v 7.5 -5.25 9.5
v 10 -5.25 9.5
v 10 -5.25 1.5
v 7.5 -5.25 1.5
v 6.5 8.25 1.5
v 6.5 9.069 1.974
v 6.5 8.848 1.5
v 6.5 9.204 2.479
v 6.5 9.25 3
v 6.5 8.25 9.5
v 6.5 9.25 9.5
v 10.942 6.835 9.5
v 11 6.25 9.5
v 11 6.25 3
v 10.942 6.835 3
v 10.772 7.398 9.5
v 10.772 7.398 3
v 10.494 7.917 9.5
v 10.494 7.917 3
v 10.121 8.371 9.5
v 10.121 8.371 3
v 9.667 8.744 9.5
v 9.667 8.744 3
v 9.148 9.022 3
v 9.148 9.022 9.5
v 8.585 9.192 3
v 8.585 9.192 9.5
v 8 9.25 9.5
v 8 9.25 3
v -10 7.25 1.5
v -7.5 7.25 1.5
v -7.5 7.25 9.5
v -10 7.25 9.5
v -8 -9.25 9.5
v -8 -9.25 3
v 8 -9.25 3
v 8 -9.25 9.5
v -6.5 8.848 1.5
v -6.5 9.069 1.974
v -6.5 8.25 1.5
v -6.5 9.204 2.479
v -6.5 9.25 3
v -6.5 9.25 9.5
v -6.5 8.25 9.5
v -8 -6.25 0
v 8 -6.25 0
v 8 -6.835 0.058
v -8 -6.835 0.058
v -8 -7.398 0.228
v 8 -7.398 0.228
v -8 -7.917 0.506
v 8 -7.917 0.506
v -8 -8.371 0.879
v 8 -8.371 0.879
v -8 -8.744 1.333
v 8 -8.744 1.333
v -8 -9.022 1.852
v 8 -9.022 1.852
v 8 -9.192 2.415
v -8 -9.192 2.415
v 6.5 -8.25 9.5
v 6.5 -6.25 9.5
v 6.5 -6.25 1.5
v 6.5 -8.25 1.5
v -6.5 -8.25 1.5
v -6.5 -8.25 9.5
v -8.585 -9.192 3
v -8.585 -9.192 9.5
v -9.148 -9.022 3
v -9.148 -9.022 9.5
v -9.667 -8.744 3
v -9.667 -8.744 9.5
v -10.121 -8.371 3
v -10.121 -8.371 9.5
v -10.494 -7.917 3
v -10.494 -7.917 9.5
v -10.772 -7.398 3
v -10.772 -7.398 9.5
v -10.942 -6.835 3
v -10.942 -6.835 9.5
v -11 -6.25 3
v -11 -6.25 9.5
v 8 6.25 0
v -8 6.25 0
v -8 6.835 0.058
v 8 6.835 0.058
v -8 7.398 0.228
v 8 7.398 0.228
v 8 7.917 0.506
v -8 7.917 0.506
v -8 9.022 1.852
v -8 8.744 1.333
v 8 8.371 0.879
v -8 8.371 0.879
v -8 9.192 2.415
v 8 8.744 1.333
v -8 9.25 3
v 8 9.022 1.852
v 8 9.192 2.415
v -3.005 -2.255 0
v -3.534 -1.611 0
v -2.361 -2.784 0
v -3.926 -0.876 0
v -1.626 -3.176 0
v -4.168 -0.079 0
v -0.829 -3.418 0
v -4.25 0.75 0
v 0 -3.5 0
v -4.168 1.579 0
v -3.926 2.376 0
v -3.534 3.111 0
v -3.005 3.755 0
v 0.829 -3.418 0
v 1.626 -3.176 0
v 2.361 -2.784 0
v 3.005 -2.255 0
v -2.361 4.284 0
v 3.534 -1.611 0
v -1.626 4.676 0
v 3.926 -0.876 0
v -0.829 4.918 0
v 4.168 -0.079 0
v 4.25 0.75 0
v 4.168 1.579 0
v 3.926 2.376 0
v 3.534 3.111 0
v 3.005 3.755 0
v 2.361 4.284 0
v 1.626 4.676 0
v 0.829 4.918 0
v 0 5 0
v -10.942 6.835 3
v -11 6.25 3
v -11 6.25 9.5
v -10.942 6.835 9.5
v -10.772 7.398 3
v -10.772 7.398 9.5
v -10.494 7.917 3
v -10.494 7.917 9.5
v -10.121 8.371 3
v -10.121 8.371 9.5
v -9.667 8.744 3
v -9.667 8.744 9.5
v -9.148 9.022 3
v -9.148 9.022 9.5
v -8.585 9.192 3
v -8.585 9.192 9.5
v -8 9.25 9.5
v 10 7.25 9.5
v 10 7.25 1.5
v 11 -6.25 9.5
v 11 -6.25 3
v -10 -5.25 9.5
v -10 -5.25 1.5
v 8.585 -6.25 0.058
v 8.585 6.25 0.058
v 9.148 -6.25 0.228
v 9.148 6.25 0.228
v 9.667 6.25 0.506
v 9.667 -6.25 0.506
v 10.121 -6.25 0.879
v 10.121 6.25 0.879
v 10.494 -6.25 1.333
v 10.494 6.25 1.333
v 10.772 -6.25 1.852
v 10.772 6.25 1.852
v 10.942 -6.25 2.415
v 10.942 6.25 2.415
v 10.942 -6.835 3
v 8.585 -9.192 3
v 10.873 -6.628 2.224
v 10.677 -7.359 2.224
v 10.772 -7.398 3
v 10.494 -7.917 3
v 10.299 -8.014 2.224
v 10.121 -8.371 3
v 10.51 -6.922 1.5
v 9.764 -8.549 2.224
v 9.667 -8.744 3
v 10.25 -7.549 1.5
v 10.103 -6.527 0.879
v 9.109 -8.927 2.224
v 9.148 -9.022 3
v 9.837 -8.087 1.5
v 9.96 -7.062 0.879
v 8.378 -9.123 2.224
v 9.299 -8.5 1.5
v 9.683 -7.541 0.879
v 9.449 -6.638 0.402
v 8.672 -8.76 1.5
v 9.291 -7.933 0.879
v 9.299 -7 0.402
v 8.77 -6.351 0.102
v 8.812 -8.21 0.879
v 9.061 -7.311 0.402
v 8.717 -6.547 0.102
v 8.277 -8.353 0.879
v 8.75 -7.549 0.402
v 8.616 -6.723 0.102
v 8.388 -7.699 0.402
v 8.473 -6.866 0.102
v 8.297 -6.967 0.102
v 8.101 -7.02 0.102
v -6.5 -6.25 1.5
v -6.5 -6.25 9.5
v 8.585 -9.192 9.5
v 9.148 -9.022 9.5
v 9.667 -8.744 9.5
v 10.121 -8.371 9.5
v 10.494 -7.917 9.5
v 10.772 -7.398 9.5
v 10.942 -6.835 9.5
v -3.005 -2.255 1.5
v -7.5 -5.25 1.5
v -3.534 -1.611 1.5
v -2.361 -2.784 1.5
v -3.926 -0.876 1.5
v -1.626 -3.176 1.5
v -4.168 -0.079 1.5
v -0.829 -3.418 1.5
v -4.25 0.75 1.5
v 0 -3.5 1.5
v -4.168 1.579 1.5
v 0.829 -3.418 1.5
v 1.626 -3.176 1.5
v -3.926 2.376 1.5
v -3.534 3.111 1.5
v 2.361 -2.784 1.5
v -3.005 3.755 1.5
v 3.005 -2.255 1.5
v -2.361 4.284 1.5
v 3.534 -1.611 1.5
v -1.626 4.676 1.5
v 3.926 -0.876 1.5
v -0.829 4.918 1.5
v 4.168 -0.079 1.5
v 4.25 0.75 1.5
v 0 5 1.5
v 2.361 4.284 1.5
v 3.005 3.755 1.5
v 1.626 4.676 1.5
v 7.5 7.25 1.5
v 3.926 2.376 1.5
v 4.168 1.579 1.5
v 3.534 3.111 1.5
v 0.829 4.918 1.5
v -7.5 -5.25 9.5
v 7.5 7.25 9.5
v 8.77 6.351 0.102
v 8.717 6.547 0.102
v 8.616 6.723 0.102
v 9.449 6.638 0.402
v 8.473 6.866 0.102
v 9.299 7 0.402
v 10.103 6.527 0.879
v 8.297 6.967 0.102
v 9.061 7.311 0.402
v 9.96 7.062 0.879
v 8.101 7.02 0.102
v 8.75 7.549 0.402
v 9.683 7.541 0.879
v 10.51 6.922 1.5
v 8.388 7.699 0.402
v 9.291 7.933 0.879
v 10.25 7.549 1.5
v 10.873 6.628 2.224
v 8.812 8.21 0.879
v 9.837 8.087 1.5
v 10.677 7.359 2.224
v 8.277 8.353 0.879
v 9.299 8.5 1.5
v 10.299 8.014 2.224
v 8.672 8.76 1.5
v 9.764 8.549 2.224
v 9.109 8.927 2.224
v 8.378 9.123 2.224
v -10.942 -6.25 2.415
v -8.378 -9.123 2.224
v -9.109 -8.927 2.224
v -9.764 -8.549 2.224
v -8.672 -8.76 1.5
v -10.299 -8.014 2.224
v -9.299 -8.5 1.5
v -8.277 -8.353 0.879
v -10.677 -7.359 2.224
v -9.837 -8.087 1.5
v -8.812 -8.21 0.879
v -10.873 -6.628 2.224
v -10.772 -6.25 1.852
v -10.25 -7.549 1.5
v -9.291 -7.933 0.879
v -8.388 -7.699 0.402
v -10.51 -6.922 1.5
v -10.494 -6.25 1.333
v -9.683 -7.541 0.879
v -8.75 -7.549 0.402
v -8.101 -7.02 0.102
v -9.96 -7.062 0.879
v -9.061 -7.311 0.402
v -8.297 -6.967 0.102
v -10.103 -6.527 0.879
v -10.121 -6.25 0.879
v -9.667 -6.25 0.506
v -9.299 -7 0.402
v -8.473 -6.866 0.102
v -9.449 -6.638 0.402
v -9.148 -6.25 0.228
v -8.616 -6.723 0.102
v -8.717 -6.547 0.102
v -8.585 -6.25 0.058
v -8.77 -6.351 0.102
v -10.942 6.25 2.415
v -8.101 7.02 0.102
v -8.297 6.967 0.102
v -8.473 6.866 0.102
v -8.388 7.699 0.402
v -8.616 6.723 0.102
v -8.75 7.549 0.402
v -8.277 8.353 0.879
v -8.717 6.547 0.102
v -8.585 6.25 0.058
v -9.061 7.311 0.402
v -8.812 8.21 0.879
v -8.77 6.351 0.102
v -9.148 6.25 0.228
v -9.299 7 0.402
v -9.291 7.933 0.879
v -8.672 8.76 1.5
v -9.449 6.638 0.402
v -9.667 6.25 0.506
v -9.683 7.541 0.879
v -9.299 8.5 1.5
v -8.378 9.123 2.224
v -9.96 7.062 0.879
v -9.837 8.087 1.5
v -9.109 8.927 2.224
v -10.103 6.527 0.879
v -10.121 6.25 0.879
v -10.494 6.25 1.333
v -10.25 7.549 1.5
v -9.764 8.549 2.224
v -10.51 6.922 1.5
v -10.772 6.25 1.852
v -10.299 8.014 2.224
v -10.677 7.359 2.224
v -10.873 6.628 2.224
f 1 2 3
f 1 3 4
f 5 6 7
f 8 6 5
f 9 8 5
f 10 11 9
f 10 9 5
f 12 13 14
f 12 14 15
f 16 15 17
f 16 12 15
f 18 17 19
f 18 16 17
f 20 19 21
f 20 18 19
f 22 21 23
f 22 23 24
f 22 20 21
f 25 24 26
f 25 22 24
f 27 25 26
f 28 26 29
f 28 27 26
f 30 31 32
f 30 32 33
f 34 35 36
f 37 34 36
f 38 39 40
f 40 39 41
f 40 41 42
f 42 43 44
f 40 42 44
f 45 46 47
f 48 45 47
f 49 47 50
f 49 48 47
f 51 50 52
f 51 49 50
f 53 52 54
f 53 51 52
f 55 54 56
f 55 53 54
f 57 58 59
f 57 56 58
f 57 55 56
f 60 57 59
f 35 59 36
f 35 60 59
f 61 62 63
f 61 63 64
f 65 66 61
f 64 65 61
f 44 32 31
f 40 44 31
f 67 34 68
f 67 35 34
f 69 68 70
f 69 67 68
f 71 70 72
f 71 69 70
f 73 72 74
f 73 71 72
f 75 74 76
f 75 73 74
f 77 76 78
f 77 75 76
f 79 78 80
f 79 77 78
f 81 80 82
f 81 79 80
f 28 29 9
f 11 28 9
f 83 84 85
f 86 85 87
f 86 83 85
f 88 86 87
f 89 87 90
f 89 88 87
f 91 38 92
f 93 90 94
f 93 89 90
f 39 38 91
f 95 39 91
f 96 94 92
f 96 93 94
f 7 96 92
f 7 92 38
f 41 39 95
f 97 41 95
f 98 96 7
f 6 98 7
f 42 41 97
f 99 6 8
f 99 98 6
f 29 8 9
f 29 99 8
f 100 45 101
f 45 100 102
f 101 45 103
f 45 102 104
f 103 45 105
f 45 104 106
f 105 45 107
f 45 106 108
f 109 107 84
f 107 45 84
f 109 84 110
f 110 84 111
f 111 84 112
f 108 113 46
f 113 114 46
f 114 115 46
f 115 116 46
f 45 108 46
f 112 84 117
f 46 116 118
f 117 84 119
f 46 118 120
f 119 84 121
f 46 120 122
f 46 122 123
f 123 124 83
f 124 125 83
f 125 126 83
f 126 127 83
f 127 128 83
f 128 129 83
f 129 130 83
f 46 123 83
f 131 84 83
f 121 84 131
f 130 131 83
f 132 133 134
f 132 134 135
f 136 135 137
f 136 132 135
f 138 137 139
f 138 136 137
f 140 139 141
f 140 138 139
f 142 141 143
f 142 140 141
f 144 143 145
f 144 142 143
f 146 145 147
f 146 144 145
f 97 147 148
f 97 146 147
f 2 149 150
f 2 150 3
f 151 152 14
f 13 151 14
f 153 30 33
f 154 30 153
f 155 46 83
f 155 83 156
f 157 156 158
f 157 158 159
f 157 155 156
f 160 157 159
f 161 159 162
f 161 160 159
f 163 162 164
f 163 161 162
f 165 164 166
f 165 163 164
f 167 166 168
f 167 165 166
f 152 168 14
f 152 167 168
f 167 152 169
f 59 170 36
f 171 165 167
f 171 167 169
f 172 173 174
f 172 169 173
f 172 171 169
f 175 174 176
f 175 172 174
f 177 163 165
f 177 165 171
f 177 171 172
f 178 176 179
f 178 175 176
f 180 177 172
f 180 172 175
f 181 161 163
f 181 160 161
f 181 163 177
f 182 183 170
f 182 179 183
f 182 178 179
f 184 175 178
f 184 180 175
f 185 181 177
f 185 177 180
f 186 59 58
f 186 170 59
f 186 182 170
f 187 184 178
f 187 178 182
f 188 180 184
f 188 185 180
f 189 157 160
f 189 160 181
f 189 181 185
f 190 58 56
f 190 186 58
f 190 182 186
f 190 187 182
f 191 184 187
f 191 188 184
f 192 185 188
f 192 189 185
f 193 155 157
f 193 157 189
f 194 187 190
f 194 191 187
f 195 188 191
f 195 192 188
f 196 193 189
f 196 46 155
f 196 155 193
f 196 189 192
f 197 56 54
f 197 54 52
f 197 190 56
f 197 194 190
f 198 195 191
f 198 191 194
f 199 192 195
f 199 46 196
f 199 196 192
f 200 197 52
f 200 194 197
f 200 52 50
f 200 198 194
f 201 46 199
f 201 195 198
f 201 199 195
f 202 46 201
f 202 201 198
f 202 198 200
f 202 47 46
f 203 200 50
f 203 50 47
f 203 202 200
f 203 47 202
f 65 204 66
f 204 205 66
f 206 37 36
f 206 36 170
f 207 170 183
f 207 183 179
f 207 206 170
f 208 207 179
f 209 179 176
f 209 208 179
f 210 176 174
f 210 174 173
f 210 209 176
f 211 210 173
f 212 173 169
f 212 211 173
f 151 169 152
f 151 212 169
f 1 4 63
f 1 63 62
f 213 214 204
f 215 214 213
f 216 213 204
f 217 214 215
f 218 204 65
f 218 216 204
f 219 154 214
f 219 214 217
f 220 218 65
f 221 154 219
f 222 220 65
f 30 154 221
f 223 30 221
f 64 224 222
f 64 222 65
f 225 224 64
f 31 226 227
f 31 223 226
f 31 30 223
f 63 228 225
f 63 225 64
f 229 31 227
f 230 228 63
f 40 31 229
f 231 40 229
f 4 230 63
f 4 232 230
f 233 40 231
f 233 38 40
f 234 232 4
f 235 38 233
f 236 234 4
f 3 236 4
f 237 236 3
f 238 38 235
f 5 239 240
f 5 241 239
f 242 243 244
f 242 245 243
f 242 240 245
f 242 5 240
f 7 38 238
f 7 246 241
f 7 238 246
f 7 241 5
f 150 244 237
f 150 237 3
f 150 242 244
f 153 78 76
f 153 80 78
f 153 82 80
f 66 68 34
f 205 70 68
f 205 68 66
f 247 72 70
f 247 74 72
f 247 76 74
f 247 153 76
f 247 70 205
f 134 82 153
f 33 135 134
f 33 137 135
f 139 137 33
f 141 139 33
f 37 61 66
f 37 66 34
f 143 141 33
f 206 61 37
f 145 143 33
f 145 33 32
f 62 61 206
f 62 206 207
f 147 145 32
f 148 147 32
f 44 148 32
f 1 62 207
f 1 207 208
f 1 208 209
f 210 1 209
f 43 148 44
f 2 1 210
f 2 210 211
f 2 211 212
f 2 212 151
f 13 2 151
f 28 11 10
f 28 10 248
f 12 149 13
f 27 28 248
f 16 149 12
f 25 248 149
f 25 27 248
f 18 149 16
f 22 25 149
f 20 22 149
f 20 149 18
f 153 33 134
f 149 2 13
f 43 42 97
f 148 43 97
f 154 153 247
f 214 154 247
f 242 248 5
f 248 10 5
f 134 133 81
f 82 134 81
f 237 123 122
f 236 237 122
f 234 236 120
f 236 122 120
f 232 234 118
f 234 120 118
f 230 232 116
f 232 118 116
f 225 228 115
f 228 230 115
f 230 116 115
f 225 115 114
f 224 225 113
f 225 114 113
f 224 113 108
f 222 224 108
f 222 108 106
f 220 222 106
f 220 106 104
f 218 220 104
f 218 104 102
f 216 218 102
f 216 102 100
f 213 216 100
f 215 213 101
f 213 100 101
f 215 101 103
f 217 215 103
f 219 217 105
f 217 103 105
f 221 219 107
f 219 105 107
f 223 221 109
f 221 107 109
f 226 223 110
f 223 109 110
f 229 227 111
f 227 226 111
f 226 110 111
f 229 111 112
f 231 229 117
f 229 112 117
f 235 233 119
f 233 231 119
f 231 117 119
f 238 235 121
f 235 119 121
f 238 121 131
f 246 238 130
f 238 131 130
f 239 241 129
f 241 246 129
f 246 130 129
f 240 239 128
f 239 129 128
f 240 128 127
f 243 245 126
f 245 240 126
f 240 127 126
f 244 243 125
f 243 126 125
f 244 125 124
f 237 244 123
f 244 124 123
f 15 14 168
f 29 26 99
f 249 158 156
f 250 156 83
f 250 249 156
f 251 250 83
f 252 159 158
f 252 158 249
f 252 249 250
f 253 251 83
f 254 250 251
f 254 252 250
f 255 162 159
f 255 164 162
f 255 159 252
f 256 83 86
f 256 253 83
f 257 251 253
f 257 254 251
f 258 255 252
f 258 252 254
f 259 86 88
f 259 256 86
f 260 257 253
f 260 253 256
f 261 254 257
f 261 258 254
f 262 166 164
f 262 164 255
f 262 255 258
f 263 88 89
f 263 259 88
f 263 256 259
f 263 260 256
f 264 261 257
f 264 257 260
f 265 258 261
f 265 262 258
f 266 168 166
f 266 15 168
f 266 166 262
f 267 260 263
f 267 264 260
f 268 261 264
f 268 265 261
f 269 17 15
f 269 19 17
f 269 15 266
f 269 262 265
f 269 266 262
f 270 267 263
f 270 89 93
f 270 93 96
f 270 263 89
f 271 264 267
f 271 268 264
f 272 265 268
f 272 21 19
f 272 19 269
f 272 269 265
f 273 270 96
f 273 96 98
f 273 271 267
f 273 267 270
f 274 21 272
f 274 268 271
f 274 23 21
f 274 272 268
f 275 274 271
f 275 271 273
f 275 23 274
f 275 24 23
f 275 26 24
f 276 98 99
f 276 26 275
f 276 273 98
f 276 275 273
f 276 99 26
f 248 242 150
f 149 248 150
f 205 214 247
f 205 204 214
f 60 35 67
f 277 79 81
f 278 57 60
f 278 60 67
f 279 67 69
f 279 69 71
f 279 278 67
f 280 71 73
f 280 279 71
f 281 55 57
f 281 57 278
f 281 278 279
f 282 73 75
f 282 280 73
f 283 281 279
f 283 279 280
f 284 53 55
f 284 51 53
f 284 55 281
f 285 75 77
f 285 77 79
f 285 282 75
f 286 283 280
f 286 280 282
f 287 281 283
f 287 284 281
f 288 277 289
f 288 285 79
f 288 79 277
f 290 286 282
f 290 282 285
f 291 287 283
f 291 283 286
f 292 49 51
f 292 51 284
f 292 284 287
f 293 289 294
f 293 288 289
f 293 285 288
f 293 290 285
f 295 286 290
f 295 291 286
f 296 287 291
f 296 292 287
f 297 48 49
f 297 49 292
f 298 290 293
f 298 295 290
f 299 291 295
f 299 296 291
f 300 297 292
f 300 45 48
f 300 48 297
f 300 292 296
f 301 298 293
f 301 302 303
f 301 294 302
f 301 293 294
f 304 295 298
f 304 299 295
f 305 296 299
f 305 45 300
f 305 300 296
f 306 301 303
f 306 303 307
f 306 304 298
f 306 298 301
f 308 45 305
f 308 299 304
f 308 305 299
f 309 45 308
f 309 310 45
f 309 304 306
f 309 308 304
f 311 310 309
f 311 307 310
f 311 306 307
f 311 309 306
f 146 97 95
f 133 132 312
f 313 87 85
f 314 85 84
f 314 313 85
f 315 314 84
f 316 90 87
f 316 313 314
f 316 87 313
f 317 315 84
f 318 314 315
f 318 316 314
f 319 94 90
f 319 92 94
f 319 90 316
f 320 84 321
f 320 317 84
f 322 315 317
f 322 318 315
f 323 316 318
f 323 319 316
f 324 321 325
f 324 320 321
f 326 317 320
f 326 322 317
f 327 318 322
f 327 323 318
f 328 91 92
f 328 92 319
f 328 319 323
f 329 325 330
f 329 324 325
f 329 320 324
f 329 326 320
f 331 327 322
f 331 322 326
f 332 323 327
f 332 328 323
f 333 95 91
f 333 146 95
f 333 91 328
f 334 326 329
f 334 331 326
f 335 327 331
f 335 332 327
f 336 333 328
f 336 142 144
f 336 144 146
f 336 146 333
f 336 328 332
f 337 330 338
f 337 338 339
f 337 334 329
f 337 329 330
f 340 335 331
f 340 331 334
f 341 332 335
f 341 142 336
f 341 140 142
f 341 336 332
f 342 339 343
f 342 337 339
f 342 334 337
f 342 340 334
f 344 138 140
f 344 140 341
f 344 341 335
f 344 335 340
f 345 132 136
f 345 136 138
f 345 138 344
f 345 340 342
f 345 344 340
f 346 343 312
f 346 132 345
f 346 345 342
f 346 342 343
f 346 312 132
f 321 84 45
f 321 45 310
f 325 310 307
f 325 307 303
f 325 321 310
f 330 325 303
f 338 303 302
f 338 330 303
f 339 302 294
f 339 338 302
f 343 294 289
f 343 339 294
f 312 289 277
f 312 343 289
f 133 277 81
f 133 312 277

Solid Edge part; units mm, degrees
sketch "Sketch1" plane through (0, 0, 0) normal (0, 0, 1) x (1, 0, 0)
  line L0 (-11, -9.25) -> (11, -9.25)
  line L1 (11, -9.25) -> (11, 9.25)
  line L2 (11, 9.25) -> (-11, 9.25)
  line L3 (-11, 9.25) -> (-11, -9.25)
  circle A0 centre (0, 0.75) radius 4.25
  dimension "D1" = 18.5
  dimension "D2" = 22
  dimension "D3" = 8.5
  dimension "D4" = 8.5
extrude "Protrusion1" add sketch "Sketch1" along normal blind 1.5
sketch "Sketch2" plane through (0, 0, 1.5) normal (0, 0, 1) x (1, 0, 0)
  line L0 (11, -9.25) -> (6, -9.25)
  line L1 (6, -9.25) -> (6, -4.75)
  line L2 (6, -4.75) -> (11, -4.75)
  line L3 (11, -4.75) -> (11, -9.25)
  line L4 (-11, -9.25) -> (-6, -9.25)
  line L5 (-6, -9.25) -> (-6, -4.75)
  line L6 (-6, -4.75) -> (-11, -4.75)
  line L7 (-11, -4.75) -> (-11, -9.25)
  dimension "D1" = 4.5
  dimension "D2" = 5
  dimension "D3" = 5
  dimension "D4" = 4.5
extrude "bottom_extension" add sketch "Sketch2" along normal blind 8
sketch "Sketch3" plane through (0, 0, 1.5) normal (0, 0, 1) x (1, 0, 0)
  line L0 (-6, -9.25) -> (6, -9.25)
  line L1 (6, -9.25) -> (6, -8.25)
  line L2 (6, -8.25) -> (-6, -8.25)
  line L3 (-6, -8.25) -> (-6, -9.25)
  dimension "D1" = 1
extrude "Protrusion2" add sketch "Sketch3" along normal up to vertex (8 mm away)
sketch "Sketch4" plane through (0, 0.5, 1.5) normal (0, 0, 1) x (1, 0, 0)
  line L0 (11, 8.75) -> (6, 8.75)
  line L1 (6, 8.75) -> (6, 6.75)
  line L2 (6, 6.75) -> (11, 6.75)
  line L3 (11, 6.75) -> (11, 8.75)
  line L4 (-11, 8.75) -> (-6, 8.75)
  line L5 (-6, 8.75) -> (-6, 6.75)
  line L6 (-6, 6.75) -> (-11, 6.75)
  line L7 (-11, 6.75) -> (-11, 8.75)
  dimension "D1" = 2
  dimension "D2" = 5
extrude "Protrusion3" add sketch "Sketch4" along normal up to vertex (8 mm away)
sketch "Sketch5" plane through (0, 0.5, 1.5) normal (0, 0, 1) x (1, 0, 0)
  line L0 (-11, 6.75) -> (-10, 6.75)
  line L1 (-10, 6.75) -> (-10, -5.25)
  line L2 (-10, -5.25) -> (-11, -5.25)
  line L3 (-11, -5.25) -> (-11, 6.75)
  line L4 (11, -5.25) -> (10, -5.25)
  line L5 (10, -5.25) -> (10, 6.75)
  line L6 (10, 6.75) -> (11, 6.75)
  line L7 (11, 6.75) -> (11, -5.25)
  dimension "D1" = 1
  dimension "D2" = 1
extrude "Protrusion4" add sketch "Sketch5" along normal up to vertex (8 mm away)
fillet "Verrundung_1" radius 3 4 edges at (-11, 9.25, 4.75) (11, 9.25, 4.75) (11, -9.25, 4.75) (-11, -9.25, 4.75)
fillet "Verrundung_2" radius 3 7 edges at (0, -9.25, 0) (10.1213, -8.3713, 0) (11, 0, 0) (0, 9.25, 0) (-10.1213, 8.3713, 0) (-11, 0, 0) (-10.1213, -8.3713, 0)
sketch "Sketch6" plane through (0, 0, 9.5) normal (0, 0, 1) x (1, 0, 0)
  line L0 (-6, 9.25) -> (-6.5, 9.25)
  line L1 (-6.5, 9.25) -> (-6.5, 7.25)
  line L2 (-6.5, 7.25) -> (-6, 7.25)
  line L3 (-6, 7.25) -> (-6, 9.25)
  line L4 (6, 9.25) -> (6.5, 9.25)
  line L5 (6.5, 9.25) -> (6.5, 7.25)
  line L6 (6.5, 7.25) -> (6, 7.25)
  line L7 (6, 7.25) -> (6, 9.25)
  line L8 (-10, -4.75) -> (-6, -4.75)
  line L9 (-6, -4.75) -> (-6, -8.25)
  line L10 (-6.5, -8.25) -> (-6, -8.25)
  line L11 (-6.5, -5.25) -> (-6.5, -8.25)
  line L12 (-10, -5.25) -> (-6.5, -5.25)
  line L13 (-10, -5.25) -> (-10, -4.75)
  line L14 (6, -4.75) -> (10, -4.75)
  line L15 (10, -4.75) -> (10, -5.25)
  line L16 (10, -5.25) -> (6.5, -5.25)
  line L17 (6.5, -5.25) -> (6.5, -8.25)
  line L18 (6.5, -8.25) -> (6, -8.25)
  line L19 (6, -8.25) -> (6, -4.75)
  dimension "D1" = 0.5
extrude "Cutout1" cut sketch "Sketch6" against normal up to vertex (8 mm away)
chamfer "Fase_2" distance 1 angle 45 4 edges at (-6.5, 7.25, 5.5) (6.5, 7.25, 5.5) (6.5, -5.25, 5.5) (-6.5, -5.25, 5.5)
properties material "ABS-Plastik, mittelfest"
